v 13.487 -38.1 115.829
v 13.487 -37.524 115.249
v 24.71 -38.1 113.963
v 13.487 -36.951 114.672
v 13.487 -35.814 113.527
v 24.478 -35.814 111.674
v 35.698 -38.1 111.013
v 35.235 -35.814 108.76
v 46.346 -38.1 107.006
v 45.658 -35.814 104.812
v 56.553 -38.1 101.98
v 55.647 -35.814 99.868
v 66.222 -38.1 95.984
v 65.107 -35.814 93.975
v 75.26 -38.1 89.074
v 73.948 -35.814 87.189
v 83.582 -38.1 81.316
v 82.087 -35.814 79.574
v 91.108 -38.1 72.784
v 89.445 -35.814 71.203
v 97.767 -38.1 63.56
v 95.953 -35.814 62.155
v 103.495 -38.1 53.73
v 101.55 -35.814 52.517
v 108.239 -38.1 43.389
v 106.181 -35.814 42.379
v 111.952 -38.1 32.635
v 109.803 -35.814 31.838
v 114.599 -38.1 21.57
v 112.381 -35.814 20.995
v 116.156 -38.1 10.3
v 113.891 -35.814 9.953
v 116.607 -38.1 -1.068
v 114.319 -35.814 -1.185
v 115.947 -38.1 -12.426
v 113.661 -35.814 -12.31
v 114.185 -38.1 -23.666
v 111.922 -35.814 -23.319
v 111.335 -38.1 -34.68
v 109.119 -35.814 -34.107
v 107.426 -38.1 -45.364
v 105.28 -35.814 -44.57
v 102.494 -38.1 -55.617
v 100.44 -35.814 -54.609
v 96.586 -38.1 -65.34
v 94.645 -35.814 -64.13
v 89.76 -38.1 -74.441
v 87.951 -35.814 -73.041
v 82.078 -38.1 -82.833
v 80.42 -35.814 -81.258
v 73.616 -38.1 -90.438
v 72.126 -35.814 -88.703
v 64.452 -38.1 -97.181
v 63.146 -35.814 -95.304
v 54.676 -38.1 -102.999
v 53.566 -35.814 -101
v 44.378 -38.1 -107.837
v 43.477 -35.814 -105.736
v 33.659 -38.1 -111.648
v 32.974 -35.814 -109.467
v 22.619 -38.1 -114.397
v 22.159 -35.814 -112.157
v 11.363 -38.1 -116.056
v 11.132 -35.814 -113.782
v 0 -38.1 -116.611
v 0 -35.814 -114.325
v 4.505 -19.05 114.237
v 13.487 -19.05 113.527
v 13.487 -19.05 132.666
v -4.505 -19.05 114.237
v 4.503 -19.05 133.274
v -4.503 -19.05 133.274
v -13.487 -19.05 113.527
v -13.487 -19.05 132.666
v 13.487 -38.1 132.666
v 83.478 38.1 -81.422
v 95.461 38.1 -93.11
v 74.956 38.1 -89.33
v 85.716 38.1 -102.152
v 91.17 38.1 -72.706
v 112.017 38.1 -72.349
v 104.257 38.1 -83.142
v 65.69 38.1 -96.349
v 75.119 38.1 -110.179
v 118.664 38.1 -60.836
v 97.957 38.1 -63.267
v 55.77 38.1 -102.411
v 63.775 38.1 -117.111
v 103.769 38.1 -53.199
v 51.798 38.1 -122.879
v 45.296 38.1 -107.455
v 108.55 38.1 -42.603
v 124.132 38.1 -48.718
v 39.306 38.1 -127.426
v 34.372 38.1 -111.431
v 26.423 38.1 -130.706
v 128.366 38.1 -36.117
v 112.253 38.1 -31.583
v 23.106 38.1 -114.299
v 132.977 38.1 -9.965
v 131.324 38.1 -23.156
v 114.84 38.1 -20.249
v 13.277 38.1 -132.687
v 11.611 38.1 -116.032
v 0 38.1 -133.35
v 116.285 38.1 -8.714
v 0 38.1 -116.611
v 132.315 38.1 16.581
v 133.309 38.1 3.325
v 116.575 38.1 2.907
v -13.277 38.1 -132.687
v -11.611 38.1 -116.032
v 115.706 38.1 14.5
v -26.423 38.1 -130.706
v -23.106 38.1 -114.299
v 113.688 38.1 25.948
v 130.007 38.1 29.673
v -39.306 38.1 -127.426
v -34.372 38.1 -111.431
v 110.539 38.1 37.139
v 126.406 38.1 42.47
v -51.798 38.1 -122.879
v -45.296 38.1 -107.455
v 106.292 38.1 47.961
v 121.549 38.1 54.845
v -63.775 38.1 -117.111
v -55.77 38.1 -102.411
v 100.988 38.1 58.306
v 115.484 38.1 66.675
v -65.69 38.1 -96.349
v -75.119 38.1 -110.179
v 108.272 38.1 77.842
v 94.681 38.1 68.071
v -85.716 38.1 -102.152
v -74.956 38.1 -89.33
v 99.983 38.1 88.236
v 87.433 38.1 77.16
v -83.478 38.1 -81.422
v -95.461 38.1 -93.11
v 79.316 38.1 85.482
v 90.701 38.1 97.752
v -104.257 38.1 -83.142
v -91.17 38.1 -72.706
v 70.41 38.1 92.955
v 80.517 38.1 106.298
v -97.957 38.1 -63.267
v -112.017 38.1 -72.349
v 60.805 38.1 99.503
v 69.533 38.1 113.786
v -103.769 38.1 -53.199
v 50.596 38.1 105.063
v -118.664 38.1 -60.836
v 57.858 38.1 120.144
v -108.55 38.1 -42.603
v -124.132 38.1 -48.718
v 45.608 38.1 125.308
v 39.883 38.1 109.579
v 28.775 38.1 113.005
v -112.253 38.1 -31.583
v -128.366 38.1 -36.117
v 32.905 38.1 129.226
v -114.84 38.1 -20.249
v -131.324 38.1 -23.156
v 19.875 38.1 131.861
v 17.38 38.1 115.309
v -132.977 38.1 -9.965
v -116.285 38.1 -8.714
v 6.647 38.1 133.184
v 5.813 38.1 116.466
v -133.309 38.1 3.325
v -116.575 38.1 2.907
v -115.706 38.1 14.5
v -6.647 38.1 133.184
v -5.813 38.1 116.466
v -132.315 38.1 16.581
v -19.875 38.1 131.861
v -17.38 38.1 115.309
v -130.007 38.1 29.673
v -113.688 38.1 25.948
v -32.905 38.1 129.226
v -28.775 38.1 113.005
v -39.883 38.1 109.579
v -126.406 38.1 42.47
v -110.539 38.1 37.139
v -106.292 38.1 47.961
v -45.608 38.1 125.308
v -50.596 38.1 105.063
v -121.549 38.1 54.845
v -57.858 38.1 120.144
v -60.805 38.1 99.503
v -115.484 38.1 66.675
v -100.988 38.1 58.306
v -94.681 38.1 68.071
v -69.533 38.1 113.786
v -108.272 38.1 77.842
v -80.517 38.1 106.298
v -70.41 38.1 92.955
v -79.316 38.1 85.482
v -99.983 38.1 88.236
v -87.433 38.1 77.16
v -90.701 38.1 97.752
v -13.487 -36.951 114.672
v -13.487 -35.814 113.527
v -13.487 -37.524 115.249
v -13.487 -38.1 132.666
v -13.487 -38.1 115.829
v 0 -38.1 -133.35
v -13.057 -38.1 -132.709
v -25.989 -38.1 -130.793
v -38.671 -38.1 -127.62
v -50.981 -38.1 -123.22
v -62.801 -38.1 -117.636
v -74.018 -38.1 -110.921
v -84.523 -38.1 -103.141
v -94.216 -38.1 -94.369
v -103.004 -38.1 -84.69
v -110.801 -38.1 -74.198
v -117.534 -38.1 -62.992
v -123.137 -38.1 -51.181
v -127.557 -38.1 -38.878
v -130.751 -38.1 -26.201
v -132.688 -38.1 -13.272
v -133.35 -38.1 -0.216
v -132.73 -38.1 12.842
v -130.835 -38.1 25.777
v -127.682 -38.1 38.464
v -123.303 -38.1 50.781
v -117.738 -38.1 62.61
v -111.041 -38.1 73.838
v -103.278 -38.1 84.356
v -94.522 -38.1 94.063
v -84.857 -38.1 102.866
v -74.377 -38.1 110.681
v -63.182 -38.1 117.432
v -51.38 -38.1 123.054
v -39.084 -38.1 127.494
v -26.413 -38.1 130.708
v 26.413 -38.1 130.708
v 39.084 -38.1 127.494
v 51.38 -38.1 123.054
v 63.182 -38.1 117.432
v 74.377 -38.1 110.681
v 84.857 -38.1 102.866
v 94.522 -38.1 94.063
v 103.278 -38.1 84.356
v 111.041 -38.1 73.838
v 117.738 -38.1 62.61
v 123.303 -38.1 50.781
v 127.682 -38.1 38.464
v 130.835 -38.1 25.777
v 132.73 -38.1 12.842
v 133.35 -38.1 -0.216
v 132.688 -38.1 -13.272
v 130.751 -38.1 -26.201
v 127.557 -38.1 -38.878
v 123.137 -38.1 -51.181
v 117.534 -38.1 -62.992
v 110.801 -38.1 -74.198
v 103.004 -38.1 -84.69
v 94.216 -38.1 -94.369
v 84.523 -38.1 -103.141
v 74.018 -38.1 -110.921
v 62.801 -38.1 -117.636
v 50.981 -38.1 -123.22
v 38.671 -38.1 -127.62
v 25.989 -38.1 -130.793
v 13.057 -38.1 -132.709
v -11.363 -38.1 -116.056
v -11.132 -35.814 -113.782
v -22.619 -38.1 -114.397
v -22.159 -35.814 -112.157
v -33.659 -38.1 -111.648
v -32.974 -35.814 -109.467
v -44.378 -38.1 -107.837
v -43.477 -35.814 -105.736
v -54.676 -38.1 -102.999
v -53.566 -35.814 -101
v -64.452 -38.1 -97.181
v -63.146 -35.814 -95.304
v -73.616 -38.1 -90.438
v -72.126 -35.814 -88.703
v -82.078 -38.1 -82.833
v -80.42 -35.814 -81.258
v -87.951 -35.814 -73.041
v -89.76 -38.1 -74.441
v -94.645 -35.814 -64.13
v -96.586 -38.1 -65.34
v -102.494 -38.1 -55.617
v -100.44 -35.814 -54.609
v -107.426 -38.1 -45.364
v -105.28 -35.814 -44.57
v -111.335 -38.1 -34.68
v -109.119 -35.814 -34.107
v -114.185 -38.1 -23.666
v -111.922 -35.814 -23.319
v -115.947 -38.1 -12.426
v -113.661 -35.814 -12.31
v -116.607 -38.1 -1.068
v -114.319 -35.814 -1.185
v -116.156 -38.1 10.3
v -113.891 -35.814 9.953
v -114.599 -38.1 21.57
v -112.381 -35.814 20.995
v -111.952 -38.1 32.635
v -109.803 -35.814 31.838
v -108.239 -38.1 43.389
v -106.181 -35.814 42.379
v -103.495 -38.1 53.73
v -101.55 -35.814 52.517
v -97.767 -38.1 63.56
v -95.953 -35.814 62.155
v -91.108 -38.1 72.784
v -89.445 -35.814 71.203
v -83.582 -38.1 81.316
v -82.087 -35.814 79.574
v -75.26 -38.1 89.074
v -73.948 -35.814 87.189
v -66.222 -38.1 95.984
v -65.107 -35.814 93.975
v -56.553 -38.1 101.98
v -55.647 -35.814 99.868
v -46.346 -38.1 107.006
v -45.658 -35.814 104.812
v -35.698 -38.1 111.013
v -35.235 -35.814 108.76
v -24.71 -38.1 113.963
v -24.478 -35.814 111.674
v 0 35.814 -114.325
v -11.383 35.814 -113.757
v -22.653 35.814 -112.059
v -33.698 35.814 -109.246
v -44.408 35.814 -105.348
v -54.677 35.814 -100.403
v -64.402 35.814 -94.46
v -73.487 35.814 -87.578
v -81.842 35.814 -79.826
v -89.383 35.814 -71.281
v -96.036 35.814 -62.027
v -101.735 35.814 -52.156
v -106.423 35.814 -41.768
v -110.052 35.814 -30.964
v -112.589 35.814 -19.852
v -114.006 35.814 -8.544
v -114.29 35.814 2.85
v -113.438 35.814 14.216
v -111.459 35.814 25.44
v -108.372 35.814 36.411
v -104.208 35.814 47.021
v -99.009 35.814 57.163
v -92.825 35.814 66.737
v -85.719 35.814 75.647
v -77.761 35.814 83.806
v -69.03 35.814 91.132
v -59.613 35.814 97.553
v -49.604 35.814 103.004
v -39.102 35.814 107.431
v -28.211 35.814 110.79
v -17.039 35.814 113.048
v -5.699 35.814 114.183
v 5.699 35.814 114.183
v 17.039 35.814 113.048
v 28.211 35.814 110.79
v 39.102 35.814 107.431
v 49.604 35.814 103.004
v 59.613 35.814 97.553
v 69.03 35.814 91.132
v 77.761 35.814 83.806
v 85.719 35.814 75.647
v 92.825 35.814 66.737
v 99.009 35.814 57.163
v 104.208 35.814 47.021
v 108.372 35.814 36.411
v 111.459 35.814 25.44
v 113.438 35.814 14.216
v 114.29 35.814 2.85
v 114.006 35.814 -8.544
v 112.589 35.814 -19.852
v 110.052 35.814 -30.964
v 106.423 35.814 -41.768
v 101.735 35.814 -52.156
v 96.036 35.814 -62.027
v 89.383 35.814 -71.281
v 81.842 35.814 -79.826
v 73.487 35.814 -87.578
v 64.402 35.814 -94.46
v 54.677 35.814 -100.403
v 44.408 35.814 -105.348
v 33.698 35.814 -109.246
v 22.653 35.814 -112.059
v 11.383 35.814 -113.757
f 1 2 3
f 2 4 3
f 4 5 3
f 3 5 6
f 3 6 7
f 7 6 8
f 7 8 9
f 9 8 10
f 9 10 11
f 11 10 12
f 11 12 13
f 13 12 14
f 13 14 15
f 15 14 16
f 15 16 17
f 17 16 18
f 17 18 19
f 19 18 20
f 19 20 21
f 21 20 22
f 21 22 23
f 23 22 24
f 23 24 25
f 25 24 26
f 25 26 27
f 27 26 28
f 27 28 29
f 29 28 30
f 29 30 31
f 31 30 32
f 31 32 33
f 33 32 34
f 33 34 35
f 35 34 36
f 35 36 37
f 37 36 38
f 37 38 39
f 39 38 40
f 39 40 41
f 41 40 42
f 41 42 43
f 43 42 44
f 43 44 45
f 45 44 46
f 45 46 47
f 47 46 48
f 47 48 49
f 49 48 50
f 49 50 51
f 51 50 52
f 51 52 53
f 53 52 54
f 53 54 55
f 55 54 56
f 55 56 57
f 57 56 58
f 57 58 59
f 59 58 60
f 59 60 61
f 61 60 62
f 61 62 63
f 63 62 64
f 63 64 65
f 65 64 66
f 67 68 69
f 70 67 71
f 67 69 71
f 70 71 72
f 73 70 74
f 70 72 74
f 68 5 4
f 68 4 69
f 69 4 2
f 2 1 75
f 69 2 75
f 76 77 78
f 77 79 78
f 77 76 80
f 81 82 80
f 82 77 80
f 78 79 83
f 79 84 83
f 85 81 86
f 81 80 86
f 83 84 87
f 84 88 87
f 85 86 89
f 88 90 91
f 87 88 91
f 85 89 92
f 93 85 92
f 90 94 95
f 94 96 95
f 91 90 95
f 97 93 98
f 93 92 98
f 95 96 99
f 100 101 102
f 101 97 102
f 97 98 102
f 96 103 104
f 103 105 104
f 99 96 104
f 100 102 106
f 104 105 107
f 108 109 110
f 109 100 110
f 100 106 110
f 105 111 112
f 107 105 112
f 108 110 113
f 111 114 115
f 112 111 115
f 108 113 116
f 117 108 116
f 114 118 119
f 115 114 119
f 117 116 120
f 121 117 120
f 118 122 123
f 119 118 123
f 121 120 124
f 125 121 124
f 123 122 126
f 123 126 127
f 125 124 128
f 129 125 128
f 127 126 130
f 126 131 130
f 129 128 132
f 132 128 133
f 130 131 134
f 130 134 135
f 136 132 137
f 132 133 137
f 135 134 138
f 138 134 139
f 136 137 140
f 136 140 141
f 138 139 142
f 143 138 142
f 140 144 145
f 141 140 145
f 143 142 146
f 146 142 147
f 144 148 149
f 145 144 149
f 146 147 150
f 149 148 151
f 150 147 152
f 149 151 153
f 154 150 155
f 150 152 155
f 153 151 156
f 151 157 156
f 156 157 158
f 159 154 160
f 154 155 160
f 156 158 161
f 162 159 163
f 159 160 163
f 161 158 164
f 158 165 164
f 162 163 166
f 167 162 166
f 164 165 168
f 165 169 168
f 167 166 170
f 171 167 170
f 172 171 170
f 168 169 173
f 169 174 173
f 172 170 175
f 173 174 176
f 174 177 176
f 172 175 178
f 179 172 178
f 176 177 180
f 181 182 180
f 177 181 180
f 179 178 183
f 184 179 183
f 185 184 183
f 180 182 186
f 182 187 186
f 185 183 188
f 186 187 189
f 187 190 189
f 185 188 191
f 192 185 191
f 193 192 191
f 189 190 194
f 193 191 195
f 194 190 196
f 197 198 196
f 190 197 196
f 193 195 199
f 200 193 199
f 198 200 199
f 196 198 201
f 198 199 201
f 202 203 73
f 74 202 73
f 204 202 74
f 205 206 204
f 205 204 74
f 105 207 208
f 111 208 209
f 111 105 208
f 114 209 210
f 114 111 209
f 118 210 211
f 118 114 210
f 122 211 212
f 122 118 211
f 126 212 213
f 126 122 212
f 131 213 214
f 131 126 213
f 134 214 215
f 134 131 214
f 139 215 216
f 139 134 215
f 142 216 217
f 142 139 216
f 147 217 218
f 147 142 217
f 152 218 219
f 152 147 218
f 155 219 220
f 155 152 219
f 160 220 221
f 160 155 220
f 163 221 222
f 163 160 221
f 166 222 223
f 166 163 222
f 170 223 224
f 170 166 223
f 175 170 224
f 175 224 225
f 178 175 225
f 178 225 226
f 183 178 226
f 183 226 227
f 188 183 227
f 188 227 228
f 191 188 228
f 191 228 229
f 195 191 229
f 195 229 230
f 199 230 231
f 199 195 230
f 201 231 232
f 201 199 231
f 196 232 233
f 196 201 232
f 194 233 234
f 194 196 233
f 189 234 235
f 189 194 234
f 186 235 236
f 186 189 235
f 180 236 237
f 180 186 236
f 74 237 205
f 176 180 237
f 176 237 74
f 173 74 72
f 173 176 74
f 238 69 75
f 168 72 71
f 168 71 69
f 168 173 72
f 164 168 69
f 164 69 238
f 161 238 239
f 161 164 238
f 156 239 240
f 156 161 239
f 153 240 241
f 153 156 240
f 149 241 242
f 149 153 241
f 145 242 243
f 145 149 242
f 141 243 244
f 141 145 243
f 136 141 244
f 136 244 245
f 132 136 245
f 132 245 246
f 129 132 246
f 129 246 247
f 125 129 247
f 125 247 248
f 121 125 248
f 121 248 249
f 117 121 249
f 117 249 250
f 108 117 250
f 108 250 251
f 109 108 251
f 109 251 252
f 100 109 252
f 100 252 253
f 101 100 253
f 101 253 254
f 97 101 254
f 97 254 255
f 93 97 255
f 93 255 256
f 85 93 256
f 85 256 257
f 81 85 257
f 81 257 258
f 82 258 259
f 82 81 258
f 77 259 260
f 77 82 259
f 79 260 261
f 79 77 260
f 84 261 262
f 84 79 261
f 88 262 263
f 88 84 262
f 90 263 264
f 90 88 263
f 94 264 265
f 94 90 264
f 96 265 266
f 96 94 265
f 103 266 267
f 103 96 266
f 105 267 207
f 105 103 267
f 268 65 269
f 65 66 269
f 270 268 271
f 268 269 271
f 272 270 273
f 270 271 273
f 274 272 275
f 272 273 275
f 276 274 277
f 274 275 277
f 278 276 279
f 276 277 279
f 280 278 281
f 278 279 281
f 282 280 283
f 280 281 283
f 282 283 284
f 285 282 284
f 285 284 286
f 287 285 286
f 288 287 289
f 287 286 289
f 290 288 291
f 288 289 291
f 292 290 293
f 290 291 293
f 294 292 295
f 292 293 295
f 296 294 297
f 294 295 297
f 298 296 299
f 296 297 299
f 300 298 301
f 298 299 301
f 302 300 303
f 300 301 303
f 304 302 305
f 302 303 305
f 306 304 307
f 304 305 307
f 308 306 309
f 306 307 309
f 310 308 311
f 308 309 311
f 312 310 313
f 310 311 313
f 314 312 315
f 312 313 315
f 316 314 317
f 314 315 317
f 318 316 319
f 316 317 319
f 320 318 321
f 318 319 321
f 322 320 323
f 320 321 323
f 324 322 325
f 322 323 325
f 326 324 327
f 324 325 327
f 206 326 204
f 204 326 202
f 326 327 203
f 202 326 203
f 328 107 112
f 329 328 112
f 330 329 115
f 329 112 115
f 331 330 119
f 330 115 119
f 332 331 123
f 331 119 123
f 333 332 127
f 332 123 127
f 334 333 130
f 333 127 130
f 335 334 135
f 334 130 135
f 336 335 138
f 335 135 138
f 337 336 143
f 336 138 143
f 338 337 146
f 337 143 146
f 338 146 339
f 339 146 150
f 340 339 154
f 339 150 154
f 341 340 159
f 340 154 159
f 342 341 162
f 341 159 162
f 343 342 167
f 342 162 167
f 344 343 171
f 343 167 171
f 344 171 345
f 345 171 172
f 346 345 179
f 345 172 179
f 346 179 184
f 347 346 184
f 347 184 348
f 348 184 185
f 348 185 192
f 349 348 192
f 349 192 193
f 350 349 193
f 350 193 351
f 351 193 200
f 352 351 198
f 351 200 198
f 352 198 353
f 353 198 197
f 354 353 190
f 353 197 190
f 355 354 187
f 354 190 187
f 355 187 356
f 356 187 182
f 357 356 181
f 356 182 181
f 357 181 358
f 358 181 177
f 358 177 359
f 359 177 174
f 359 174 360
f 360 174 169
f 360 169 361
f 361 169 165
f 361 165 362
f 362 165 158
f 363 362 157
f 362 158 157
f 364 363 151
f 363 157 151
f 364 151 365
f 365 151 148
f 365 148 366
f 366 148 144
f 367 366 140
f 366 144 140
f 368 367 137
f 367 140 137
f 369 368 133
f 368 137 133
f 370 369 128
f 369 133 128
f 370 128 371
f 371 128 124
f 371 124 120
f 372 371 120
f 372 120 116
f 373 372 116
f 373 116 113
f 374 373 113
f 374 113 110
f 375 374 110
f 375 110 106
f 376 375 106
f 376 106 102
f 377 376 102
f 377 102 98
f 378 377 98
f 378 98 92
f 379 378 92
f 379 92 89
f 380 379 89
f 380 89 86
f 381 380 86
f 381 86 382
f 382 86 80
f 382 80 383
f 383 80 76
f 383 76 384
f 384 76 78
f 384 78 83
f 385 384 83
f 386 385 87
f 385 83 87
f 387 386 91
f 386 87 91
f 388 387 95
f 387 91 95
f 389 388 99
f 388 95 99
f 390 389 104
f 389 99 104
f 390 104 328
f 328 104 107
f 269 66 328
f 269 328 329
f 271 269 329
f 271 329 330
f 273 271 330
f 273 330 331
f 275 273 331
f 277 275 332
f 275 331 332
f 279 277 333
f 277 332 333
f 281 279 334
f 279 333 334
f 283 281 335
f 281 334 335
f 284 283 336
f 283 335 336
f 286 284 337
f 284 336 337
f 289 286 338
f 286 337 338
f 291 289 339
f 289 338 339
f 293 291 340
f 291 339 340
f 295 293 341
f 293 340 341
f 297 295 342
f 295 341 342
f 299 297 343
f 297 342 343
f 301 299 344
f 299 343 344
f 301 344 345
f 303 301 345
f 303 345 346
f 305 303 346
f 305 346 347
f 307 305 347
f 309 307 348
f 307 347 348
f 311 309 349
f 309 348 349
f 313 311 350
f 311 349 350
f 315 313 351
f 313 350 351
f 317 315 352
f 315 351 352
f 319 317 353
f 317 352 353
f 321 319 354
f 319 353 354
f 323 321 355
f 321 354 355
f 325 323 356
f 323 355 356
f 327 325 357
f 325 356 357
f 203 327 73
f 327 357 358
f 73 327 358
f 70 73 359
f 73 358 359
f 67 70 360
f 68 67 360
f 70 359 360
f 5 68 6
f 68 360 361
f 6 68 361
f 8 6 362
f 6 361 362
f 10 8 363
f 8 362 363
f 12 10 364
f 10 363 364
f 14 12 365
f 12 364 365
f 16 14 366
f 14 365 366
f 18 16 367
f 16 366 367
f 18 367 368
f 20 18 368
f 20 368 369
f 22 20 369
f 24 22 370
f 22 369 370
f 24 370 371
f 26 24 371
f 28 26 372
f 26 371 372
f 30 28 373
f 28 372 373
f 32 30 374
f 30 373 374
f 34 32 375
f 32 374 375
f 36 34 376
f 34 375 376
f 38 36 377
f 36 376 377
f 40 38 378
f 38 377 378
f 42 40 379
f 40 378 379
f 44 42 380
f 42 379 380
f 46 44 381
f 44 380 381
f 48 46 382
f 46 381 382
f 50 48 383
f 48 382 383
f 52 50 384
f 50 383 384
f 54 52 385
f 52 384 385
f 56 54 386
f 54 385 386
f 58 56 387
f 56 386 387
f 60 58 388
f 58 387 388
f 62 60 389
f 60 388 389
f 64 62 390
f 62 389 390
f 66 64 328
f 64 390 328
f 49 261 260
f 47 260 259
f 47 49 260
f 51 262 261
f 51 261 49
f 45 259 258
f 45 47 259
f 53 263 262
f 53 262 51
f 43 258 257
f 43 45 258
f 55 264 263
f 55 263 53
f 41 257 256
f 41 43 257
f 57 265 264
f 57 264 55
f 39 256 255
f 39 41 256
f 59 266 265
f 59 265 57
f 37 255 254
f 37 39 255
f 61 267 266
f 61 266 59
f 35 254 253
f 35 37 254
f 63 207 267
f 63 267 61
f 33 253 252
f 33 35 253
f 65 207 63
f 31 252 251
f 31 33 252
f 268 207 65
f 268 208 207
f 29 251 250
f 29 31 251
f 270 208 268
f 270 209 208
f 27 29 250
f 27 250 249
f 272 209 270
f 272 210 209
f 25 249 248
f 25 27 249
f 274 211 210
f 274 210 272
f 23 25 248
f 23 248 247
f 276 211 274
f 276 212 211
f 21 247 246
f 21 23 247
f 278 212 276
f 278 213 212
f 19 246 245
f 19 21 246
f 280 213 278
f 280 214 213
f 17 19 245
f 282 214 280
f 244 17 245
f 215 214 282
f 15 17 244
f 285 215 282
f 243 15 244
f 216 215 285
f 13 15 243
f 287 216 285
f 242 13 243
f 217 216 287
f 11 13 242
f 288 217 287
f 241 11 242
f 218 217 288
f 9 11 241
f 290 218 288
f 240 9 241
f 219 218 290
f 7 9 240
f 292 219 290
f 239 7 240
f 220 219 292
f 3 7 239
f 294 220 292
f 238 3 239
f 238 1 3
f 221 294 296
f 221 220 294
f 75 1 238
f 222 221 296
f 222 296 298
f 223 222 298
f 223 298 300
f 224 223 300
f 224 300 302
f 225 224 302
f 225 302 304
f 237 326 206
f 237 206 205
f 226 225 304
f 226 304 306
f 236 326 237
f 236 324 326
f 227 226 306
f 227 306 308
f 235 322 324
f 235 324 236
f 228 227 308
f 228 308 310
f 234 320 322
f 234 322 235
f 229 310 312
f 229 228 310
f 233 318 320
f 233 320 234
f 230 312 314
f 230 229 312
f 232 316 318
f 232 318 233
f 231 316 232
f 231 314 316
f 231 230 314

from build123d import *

# Parameters (mm, degrees)
SKETCH1_W          = 76.2
SKETCH1_H          = 19.0246
CHAMFER1_SIZE      = 2.286
CUT_EXTRUDE2_START = -38.1
SKETCH2_W          = 26.9748
SKETCH2_H          = 266.7
CUT_EXTRUDE2_DEPTH = 19.05


with BuildPart() as part:
    # Sketch1 → Revolve1 (revolve)
    with BuildSketch(Plane(origin=(0, 0, 0), x_dir=(0, 1, 0), z_dir=(0, 0, 1)), mode=Mode.PRIVATE) as revolve1_sk:
        with Locations((0, 123.8377)):
            Rectangle(SKETCH1_W, SKETCH1_H)
    revolve(revolve1_sk.sketch.rotate(Axis((0, -63.5, 0), (0, 1, 0)), 270), axis=Axis((0, -63.5, 0), (0, 1, 0)))

    # Chamfer1
    chamfer1_edges = [part.edges().sort_by_distance(p)[0] for p in [
        (0, -38.1, 114.3254),
        (0, 38.1, 114.3254),
    ]]
    chamfer(chamfer1_edges, length=CHAMFER1_SIZE)

    # Sketch2 → Cut-Extrude2 (cut)
    with BuildSketch(Plane(origin=(0, 0, 0), x_dir=(-1, 0, 0), z_dir=(0, 1, 0)).offset(CUT_EXTRUDE2_START)):
        with Locations((0, 133.35)):
            Rectangle(SKETCH2_W, SKETCH2_H)
    extrude(amount=CUT_EXTRUDE2_DEPTH, mode=Mode.SUBTRACT)


solid = part.part
